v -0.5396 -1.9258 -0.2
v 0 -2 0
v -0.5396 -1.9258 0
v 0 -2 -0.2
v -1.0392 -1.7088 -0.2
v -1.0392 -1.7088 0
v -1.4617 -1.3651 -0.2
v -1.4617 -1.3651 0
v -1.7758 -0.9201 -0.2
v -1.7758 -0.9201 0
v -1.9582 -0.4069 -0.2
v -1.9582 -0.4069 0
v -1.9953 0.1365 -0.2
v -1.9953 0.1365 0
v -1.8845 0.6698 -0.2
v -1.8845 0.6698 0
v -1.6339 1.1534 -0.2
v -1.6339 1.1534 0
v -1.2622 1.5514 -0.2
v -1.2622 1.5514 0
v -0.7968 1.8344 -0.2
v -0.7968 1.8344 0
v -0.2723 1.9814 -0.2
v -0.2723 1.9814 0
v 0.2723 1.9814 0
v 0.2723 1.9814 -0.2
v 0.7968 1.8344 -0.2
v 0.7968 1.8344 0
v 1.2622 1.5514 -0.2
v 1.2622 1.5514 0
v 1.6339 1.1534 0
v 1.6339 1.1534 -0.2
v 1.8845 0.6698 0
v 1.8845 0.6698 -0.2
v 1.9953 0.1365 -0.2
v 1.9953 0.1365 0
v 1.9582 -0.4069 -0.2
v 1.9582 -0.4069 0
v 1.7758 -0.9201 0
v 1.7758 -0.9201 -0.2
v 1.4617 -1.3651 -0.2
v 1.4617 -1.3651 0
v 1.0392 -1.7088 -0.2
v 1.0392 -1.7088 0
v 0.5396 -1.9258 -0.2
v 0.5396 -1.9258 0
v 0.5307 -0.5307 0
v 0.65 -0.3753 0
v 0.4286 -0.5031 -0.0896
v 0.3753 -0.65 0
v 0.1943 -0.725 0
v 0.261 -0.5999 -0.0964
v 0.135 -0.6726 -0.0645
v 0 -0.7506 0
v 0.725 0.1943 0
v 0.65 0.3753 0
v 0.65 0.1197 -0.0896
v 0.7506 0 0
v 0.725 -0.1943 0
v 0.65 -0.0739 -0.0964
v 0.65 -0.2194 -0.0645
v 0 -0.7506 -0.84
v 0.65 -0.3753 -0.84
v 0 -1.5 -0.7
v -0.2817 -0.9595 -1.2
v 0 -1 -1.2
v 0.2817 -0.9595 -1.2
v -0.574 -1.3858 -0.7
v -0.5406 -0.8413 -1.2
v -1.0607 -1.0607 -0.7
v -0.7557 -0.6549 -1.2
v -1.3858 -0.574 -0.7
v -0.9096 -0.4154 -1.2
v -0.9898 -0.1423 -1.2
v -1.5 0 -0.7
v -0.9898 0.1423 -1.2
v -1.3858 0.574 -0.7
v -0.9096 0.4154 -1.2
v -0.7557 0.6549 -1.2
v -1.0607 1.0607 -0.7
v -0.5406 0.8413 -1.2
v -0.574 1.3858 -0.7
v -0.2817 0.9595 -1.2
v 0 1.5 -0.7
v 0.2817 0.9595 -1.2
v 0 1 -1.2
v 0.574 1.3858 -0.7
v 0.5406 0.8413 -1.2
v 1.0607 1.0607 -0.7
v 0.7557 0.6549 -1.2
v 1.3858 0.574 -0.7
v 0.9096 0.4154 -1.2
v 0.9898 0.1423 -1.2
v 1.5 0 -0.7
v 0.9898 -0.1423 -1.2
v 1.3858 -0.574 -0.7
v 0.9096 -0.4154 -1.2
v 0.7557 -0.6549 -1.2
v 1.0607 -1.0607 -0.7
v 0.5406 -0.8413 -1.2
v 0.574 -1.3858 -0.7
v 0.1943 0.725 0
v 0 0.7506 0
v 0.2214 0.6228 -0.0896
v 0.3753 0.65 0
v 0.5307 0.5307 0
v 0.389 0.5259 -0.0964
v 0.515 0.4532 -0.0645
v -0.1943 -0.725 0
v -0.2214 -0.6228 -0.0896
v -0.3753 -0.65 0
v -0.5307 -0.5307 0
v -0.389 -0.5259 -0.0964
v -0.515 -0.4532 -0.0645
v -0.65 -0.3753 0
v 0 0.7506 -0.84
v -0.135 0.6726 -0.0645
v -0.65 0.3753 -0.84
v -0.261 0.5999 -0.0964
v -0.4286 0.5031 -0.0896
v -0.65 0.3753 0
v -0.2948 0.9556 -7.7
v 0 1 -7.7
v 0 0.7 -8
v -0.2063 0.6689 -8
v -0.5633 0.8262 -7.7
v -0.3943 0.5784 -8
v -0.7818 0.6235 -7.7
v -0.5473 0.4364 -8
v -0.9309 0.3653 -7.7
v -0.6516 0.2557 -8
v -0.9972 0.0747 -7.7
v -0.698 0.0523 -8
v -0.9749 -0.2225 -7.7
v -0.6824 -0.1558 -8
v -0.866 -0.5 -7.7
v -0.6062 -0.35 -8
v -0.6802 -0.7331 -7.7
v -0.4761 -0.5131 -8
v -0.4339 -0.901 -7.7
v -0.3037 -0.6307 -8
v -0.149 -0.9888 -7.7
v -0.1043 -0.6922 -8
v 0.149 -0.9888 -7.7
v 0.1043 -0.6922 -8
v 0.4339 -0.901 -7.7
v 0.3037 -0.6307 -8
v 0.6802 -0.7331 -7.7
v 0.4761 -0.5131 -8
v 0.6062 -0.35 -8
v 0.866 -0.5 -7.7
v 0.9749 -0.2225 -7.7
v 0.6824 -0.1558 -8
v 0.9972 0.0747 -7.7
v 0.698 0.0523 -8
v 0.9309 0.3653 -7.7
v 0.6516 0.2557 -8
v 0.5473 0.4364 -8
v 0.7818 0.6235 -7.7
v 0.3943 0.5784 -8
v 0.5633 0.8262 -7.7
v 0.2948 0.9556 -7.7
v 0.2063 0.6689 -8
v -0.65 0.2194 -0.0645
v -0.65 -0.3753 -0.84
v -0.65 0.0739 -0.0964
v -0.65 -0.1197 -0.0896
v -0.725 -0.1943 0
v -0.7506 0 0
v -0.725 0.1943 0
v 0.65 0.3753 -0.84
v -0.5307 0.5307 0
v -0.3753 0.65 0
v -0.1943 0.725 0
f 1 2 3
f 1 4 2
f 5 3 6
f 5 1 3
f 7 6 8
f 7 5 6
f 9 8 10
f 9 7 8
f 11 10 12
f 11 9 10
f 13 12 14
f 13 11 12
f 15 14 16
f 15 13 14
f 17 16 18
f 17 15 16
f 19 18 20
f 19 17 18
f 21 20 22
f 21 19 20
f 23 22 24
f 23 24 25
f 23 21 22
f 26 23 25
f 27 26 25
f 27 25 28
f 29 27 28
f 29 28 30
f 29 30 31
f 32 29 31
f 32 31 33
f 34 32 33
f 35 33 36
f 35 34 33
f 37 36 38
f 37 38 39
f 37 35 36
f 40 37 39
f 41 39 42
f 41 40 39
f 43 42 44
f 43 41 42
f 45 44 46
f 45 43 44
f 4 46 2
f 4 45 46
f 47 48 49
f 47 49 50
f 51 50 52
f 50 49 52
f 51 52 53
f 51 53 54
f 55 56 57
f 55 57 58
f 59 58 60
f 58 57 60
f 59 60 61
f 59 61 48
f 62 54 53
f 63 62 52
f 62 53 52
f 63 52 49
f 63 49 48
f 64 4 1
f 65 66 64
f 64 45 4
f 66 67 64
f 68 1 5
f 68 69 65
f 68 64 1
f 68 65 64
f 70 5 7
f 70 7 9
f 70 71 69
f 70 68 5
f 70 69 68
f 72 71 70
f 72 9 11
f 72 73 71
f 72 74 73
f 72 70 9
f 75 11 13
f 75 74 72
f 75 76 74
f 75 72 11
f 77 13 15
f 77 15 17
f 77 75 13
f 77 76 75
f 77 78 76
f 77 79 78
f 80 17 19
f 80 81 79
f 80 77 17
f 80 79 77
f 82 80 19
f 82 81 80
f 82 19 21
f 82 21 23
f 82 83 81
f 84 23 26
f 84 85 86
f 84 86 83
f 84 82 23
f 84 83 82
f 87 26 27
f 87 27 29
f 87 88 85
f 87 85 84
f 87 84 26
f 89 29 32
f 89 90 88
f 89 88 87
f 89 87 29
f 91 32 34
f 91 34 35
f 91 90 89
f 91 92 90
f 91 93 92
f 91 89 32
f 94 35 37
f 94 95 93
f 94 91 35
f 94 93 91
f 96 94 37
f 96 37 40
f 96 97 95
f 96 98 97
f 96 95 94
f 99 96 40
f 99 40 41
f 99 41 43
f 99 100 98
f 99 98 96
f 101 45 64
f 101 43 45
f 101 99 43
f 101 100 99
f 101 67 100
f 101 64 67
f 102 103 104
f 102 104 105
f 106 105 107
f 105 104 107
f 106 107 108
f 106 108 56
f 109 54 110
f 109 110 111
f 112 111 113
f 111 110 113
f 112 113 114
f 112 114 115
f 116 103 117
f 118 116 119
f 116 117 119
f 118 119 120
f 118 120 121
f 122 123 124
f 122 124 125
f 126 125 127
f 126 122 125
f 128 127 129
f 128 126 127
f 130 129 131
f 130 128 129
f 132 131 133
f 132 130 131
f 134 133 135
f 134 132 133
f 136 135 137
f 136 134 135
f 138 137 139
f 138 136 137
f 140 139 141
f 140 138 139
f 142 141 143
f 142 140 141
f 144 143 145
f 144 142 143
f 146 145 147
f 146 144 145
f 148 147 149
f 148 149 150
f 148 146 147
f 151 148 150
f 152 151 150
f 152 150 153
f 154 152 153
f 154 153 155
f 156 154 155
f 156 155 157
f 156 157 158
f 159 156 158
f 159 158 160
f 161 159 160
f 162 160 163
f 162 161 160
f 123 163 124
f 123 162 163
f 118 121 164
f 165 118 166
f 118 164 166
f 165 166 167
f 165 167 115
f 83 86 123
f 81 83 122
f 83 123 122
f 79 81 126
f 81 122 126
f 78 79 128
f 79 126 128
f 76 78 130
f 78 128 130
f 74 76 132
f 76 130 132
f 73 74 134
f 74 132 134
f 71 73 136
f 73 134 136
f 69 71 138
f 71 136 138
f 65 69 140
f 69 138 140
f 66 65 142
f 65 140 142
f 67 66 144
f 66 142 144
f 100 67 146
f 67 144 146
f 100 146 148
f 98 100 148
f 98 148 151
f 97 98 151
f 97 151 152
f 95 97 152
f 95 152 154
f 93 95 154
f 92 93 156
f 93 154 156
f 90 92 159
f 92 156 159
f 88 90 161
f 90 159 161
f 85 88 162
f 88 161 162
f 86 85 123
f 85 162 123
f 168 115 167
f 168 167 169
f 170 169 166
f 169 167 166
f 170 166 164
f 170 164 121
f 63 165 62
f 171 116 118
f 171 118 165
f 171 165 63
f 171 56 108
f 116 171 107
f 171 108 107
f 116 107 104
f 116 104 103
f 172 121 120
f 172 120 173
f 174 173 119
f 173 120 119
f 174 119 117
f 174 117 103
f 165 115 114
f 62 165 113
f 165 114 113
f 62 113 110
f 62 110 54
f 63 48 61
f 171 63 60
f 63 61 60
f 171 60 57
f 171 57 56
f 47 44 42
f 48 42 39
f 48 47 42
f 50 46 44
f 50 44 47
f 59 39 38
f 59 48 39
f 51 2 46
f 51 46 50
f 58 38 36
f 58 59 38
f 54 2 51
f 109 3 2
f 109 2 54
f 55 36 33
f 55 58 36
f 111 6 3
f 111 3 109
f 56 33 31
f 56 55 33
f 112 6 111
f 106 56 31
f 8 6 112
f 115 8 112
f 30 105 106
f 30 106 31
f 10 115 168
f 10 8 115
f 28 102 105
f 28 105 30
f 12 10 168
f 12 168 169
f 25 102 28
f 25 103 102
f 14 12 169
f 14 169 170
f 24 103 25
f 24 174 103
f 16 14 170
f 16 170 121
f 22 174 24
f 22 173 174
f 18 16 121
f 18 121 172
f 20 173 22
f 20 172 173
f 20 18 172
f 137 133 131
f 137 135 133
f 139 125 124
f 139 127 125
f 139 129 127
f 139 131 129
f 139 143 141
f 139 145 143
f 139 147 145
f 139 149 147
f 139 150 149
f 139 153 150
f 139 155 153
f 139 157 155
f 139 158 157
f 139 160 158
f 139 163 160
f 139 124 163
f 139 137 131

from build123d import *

# Parameters (mm, degrees)
SKETCH1_W          = 8
SKETCH1_H          = 1
CHAMFER1_SIZE      = 0.3
CUT_EXTRUDE2_DEPTH = 0.84


with BuildPart() as part:
    # Sketch1 → Revolve1 (revolve)
    with BuildSketch(Plane(origin=(0, 0, 0), x_dir=(0, 0, -1), z_dir=(1, 0, 0))):
        with Locations((4, 0.5)):
            Rectangle(SKETCH1_W, SKETCH1_H)
    revolve(axis=Axis((0, 0, -8), (0, 0, 1)))

    # Chamfer1
    chamfer1_edges = [part.edges().sort_by_distance(p)[0] for p in [
        (0, -1, -8),
    ]]
    chamfer(chamfer1_edges, length=CHAMFER1_SIZE)

    # Sketch7 → Revolve2 (revolve)
    with BuildSketch(Plane(origin=(0, 0, 0), x_dir=(0, 0, -1), z_dir=(1, 0, 0)), mode=Mode.PRIVATE) as revolve2_sk:
        Polygon((0, 2), (0.2, 2), (1.2, 1), (1.2, 0), (0, 0), align=None)
    revolve(revolve2_sk.sketch.rotate(Axis((0, 0, 0), (0, 0, -1)), 180), axis=Axis((0, 0, 0), (0, 0, -1)))

    # Boss-Extrude1 cone 1 section (through the dimple's axis) → Boss-Extrude1 (revolve)
    with BuildSketch(Plane(origin=(0, 0, -1.2), x_dir=(0, -1, 0), z_dir=(1, 0, 0))):
        Polygon((0, 0), (1, 0), (0, 1), align=None)
    revolve(axis=Axis((0, 0, -1.2), (0, 0, -1)))

    # Sketch5 → Cut-Extrude2 (cut)
    with BuildSketch(Plane.XY):
        Polygon((0.65, -0.375277675), (0.65, 0.375277675), (0, 0.75055535), (-0.65, 0.375277675), (-0.65, -0.375277675), (0, -0.75055535), align=None)
    extrude(amount=-CUT_EXTRUDE2_DEPTH, mode=Mode.SUBTRACT)

    # Cut-Extrude3 cone 1 section (through the dimple's axis) → Cut-Extrude3 (revolve, cut)
    with BuildSketch(Plane(origin=(0, 0, 0), x_dir=(0, -1, 0), z_dir=(1, 0, 0))):
        Polygon((0, 0), (0.75055535, 0), (0, 0.75055535), align=None)
    revolve(axis=Axis((0, 0, 0), (0, 0, -1)), mode=Mode.SUBTRACT)


solid = part.part
